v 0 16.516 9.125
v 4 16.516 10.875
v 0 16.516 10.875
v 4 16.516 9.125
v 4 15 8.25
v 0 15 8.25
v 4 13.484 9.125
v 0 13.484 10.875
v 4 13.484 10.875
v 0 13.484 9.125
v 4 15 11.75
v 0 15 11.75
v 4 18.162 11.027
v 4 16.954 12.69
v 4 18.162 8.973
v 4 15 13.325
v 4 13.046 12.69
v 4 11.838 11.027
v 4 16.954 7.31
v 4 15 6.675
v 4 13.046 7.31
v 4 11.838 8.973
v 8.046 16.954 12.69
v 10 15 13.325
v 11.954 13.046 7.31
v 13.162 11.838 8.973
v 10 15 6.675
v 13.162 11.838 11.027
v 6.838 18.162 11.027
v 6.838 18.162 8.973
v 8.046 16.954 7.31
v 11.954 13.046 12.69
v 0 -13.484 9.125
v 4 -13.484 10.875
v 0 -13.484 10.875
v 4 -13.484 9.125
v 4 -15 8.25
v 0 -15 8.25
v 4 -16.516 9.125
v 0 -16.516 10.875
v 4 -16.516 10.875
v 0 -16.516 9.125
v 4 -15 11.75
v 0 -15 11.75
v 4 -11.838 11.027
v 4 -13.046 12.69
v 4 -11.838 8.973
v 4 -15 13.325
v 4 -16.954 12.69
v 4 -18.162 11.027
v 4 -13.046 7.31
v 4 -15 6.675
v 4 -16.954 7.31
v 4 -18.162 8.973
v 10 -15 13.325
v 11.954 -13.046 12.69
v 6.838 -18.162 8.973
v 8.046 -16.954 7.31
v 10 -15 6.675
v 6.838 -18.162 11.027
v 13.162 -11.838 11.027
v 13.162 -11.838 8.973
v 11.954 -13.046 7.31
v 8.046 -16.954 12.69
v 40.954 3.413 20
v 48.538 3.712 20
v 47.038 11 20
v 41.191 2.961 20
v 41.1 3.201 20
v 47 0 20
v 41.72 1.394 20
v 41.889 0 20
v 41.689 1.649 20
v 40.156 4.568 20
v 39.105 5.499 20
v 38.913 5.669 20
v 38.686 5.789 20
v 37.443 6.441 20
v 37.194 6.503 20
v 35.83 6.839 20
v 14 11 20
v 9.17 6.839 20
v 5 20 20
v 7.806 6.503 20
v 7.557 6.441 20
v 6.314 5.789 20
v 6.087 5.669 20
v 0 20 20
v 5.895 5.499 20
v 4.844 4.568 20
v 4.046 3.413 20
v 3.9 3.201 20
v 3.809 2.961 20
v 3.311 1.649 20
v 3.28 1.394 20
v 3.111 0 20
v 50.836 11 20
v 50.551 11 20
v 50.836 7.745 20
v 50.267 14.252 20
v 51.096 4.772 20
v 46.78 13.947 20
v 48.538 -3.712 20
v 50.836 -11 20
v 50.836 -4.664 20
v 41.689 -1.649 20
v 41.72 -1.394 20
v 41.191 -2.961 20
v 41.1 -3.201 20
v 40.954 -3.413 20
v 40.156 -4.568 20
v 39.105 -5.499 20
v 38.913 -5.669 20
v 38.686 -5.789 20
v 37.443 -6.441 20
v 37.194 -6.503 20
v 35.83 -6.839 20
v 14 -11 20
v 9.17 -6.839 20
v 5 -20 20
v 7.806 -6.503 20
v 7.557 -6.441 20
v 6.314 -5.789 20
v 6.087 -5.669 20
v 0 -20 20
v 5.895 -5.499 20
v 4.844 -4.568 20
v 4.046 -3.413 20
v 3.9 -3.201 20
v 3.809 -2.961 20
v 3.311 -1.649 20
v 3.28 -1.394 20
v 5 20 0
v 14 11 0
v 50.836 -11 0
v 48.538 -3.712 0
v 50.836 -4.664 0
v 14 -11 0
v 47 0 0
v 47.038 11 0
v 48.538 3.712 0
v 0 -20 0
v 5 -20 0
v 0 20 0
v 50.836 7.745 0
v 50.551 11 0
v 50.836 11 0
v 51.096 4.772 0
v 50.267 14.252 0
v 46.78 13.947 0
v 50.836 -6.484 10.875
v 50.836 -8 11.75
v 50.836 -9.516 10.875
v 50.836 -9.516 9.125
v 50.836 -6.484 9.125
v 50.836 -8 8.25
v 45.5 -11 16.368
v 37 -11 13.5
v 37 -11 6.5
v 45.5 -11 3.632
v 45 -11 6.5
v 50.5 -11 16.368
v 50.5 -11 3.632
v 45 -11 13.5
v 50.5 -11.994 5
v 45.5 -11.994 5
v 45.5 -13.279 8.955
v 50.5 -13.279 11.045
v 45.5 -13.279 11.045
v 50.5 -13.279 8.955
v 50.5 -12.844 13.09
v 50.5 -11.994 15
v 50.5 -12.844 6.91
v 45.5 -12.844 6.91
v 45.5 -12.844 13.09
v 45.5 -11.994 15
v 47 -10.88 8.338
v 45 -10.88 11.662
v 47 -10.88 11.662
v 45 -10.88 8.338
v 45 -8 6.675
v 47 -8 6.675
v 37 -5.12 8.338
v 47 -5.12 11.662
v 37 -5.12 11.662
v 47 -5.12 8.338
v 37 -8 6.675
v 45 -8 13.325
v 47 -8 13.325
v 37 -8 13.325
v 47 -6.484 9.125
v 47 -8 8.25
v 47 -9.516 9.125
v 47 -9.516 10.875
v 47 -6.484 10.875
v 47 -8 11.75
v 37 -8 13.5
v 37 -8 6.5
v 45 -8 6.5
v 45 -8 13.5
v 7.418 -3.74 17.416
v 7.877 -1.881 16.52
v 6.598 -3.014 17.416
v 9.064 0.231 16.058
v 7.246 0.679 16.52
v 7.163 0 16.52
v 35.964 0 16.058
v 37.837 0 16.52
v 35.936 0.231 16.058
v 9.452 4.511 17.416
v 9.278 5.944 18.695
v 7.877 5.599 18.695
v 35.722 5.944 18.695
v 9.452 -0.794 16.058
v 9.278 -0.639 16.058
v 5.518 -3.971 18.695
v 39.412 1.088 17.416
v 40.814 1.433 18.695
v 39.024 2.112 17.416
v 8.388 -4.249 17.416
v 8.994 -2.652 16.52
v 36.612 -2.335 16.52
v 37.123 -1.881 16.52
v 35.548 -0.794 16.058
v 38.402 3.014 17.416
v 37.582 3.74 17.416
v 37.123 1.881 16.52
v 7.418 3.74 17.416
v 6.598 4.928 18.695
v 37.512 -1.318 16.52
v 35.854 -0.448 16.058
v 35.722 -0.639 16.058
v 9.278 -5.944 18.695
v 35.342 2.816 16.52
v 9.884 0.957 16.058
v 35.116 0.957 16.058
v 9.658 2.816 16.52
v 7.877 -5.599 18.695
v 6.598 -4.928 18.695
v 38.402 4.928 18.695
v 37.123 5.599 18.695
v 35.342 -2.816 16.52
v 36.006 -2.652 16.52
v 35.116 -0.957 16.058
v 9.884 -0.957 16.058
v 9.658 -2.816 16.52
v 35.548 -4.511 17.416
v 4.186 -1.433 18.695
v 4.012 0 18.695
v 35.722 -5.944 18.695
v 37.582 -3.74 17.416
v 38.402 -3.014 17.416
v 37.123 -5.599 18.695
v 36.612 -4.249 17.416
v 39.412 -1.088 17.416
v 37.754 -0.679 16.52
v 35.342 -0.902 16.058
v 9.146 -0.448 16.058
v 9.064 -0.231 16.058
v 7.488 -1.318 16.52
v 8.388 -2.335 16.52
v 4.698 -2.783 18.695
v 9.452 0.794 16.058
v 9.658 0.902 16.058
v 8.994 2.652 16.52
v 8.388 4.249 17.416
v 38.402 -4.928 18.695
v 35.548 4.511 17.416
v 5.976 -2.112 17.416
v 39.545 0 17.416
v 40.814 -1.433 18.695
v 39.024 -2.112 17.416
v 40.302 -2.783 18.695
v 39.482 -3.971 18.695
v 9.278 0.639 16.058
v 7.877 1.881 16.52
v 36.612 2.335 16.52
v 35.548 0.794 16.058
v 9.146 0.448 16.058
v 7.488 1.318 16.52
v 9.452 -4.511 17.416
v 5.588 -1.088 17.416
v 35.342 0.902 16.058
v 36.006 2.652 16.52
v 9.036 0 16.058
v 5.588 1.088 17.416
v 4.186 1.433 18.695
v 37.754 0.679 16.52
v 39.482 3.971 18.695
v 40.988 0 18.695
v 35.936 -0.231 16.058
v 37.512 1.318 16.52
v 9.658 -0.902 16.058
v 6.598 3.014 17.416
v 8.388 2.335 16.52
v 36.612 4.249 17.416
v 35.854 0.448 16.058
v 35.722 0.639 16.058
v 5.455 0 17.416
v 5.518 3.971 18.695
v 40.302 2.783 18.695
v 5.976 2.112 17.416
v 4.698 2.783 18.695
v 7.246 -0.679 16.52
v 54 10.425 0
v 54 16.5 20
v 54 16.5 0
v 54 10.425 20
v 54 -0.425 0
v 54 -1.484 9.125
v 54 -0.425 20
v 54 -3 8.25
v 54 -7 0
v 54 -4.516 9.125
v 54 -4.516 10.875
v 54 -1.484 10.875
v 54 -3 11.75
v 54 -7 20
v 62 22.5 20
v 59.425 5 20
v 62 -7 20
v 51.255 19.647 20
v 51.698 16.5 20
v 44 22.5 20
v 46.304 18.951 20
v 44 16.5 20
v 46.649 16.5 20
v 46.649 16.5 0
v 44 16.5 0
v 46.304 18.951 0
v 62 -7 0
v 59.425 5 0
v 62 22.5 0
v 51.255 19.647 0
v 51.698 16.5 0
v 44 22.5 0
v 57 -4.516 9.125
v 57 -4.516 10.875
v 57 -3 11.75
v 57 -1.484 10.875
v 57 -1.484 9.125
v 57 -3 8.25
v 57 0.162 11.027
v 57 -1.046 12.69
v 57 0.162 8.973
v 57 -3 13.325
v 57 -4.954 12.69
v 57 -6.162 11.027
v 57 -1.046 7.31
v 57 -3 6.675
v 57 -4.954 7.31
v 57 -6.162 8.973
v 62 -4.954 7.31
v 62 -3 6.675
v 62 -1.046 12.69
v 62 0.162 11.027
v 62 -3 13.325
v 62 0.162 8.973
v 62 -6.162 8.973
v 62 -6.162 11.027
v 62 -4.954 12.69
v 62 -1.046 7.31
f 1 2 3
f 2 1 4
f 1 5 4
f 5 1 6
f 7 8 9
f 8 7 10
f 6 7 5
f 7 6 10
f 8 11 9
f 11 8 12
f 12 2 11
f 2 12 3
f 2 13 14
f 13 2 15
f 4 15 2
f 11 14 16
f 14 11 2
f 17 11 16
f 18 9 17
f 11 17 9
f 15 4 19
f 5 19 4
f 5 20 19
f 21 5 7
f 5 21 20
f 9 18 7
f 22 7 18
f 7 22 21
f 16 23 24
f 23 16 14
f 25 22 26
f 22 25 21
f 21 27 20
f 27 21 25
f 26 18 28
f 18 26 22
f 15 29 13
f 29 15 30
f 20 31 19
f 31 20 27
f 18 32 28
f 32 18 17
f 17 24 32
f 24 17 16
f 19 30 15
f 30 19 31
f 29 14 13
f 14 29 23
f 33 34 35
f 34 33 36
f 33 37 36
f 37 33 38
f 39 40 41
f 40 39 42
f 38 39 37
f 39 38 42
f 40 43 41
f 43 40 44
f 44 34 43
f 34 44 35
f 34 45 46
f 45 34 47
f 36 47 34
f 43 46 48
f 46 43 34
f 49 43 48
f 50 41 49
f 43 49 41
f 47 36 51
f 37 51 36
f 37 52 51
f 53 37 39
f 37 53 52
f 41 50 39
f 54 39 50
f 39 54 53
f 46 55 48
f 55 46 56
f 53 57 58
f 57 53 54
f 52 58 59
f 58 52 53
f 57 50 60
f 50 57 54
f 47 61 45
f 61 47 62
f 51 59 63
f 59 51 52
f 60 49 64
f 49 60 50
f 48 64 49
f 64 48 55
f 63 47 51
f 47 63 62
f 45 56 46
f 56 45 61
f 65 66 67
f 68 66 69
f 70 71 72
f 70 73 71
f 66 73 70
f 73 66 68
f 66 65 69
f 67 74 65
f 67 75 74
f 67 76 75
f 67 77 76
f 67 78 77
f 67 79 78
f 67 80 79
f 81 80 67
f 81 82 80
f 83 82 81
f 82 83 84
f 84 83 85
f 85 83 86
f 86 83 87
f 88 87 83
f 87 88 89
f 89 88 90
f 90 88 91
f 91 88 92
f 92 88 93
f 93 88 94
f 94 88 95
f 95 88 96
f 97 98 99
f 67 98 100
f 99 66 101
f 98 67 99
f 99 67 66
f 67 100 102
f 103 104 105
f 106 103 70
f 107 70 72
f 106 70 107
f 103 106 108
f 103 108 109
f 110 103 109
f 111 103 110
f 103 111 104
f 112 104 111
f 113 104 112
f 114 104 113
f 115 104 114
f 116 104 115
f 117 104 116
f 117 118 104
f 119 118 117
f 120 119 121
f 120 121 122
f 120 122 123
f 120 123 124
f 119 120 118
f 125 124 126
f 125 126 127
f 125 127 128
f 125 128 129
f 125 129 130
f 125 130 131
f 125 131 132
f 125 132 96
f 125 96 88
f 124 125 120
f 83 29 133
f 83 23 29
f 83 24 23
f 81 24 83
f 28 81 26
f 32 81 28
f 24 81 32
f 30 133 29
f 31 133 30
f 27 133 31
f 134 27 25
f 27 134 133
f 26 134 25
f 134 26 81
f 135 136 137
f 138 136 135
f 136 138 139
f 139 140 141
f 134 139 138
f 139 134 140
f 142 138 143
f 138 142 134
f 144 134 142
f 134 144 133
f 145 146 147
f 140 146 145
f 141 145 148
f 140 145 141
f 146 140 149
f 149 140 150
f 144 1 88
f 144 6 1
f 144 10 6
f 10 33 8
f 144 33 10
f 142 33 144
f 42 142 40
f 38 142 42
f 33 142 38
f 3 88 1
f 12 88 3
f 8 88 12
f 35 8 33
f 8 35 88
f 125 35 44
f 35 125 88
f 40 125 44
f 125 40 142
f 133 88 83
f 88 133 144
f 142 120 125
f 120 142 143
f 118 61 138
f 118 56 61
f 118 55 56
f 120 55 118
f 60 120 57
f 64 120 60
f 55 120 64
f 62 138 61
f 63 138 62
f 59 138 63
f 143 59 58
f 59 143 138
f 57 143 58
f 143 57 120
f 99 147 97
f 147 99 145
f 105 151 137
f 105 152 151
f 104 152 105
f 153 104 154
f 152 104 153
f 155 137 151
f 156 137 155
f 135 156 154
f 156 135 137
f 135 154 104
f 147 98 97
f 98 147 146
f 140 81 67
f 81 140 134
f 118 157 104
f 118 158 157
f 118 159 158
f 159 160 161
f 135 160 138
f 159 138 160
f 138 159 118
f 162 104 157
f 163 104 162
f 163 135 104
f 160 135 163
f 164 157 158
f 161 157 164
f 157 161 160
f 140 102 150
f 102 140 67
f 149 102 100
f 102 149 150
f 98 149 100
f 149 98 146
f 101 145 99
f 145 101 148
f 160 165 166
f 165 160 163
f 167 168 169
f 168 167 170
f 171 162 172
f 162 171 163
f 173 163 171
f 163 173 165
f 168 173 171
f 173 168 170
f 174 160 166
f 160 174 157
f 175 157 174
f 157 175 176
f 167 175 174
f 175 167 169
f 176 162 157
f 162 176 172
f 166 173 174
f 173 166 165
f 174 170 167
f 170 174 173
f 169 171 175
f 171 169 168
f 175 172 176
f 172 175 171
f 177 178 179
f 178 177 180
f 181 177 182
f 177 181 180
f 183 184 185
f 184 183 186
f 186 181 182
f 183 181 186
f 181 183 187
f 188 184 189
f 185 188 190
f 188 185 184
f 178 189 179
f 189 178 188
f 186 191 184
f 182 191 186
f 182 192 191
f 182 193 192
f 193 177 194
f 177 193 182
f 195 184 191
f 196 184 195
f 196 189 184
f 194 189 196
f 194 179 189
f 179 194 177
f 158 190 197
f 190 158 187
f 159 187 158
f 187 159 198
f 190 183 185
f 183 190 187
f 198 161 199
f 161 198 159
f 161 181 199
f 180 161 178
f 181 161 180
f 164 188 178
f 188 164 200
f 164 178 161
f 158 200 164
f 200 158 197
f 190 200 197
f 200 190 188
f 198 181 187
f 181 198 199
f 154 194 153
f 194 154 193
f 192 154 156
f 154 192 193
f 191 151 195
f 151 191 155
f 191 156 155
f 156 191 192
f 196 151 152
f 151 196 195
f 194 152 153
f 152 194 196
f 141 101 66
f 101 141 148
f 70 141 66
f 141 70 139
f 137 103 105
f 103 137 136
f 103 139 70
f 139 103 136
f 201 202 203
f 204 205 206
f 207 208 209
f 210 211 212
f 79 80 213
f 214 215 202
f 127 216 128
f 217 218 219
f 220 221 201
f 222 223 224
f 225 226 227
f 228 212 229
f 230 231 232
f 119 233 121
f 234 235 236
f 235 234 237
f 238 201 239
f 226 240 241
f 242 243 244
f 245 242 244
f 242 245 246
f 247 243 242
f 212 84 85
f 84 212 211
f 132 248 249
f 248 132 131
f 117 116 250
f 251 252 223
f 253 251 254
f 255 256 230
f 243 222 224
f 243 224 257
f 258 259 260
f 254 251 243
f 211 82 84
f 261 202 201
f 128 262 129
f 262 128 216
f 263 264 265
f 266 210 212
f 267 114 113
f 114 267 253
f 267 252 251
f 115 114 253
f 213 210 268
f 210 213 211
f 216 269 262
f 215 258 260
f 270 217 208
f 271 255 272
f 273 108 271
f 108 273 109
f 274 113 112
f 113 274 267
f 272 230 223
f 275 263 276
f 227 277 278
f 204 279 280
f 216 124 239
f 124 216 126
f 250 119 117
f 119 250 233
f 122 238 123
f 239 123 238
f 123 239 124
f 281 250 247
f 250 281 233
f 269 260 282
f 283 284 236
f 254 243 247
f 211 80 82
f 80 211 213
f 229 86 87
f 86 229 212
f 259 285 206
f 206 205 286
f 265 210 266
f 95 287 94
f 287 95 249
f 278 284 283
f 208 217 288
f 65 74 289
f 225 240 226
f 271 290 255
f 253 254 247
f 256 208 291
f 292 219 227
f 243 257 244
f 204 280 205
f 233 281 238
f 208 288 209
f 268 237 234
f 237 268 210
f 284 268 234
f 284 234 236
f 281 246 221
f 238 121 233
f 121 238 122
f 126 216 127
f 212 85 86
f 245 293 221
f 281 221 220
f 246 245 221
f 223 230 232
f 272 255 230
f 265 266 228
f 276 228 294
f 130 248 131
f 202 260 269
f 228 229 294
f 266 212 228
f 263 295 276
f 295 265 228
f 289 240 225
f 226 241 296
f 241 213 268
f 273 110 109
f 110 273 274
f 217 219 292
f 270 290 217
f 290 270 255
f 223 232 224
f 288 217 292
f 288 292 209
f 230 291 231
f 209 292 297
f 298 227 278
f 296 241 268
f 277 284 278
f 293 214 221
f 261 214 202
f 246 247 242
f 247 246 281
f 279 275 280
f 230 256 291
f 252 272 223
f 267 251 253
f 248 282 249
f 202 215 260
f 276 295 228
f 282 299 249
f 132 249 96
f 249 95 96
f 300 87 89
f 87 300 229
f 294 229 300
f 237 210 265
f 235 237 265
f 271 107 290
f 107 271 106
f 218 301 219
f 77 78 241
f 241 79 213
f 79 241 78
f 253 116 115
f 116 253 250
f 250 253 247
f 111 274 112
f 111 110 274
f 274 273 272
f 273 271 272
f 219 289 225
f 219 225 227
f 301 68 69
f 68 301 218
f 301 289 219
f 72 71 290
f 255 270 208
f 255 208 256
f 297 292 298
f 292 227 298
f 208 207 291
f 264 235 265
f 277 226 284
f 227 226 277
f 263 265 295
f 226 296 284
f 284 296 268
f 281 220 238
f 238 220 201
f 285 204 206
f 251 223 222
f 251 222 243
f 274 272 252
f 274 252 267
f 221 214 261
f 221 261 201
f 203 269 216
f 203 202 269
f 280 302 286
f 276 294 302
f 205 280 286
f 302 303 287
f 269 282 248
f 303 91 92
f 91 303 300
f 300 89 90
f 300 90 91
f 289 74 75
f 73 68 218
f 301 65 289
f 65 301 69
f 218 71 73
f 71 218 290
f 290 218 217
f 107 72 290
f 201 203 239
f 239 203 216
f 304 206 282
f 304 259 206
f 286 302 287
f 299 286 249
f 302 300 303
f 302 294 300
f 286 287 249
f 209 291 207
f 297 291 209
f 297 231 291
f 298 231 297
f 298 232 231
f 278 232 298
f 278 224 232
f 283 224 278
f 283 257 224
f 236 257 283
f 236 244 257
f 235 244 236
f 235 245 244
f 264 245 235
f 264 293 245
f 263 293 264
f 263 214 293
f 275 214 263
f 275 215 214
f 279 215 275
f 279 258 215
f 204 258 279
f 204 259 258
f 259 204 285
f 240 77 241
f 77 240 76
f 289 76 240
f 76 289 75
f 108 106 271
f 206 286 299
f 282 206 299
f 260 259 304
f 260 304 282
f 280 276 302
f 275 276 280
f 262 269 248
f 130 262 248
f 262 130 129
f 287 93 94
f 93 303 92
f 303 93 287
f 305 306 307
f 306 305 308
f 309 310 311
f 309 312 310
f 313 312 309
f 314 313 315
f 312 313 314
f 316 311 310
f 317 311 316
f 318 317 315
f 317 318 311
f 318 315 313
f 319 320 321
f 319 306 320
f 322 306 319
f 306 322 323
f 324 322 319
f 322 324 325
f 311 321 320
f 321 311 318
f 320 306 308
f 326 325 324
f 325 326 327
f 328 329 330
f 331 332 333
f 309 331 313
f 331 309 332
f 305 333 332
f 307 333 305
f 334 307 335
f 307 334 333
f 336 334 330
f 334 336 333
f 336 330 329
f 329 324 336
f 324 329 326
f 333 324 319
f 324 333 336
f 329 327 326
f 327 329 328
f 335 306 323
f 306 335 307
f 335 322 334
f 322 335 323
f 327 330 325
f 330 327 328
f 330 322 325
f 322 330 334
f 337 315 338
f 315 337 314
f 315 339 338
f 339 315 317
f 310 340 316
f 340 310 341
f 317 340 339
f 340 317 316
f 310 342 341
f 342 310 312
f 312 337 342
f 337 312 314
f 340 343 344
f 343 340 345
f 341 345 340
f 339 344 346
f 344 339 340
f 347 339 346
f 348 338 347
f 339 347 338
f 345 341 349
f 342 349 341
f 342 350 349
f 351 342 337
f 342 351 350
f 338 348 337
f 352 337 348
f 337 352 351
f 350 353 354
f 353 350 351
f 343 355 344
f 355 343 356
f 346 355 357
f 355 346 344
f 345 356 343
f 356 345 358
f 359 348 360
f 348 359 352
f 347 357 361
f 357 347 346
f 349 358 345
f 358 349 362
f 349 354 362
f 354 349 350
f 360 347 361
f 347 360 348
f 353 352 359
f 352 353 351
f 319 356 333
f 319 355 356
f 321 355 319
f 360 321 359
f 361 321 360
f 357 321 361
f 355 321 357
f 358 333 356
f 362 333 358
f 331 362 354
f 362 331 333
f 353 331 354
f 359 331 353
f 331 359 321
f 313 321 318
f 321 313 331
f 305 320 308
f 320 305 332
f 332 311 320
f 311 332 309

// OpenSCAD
// distance from end to rod beginning (contact)
distance = 47;
// default value 20 is fine
column_height = 20;

// print both parts with 40-50% infill
mount_plotter();
//translate ([52,0,0]) 
translate ([52,5,0]) 
mount_clamp();

module screw_hole(d=3.5, fn=10, pocket = false)
{
    cylinder(r=d/2, h = 20);
    translate([0,0,-7]){
        cylinder(r=d*0.95, h = 10, $fn=fn);
        if (pocket)
        {
            translate([-d,-20,0]) cube([2*d,20,8]);
        }
    }
}
rod_r = 10.5 / 2;
module mount_clamp()
{
    //translate([0,0,0]) cylinder(r=rod_r, h=column_height);
    translate([-8,11.5,0]) difference(){ 
        cube([10, 6, column_height]);
        translate([3,-2.5,0]) rotate([0,0,8]) cube([5, 5, column_height]);
    }
    
    difference(){
        translate([2,-12,0]) cube([8, 29.5, column_height]);
        // rod hole
        translate([0,0,0]) cylinder(r=rod_r*sqrt(2), h=column_height, $fn = 4);
        // screw hole
        translate([8,-8,column_height/2]) rotate([0,-90,0]) screw_hole();
    }
}

module mount_plotter()
{
    difference(){
        mount_column();
        translate([10,0,column_height+4]) hull(){ sphere(r=8); translate([distance-22,0,0]) sphere(r=8); };
    }
}
module mount_column(){
    base_width = 40;
    difference() {
        // base
        translate([0,-base_width/2,0]) hull(){
            cube([5, base_width,column_height ]);
            translate([10,base_width/4,0]) cube([5, base_width/2 ,column_height ]);
        }
        // base screw holes
        for( i = [1,-1])
            translate([7,i*(base_width-10)/2, column_height/2]) rotate([180,90,0]) screw_hole();
    }
    difference(){
        union(){
            // column
            translate([0,-11,0]) cube([distance+rod_r-sqrt(2), 22,column_height]); 
            // tooth
            translate([distance+1,0,0]) rotate([0,0,5]) cube([3.5, 14,column_height]);
            translate([distance-1.5,-column_height/6,column_height/2]) rotate([0,90,0]) cylinder(r=column_height/2, h = 5);
            
        }
    // rod hole
    translate([distance+rod_r,0,0]) cylinder(r=rod_r, h=column_height, $fn=8);
    
     translate([distance-3,-8,column_height/2]) rotate([0,90,0]) screw_hole(fn=6, pocket = true);   
    }
    
}
